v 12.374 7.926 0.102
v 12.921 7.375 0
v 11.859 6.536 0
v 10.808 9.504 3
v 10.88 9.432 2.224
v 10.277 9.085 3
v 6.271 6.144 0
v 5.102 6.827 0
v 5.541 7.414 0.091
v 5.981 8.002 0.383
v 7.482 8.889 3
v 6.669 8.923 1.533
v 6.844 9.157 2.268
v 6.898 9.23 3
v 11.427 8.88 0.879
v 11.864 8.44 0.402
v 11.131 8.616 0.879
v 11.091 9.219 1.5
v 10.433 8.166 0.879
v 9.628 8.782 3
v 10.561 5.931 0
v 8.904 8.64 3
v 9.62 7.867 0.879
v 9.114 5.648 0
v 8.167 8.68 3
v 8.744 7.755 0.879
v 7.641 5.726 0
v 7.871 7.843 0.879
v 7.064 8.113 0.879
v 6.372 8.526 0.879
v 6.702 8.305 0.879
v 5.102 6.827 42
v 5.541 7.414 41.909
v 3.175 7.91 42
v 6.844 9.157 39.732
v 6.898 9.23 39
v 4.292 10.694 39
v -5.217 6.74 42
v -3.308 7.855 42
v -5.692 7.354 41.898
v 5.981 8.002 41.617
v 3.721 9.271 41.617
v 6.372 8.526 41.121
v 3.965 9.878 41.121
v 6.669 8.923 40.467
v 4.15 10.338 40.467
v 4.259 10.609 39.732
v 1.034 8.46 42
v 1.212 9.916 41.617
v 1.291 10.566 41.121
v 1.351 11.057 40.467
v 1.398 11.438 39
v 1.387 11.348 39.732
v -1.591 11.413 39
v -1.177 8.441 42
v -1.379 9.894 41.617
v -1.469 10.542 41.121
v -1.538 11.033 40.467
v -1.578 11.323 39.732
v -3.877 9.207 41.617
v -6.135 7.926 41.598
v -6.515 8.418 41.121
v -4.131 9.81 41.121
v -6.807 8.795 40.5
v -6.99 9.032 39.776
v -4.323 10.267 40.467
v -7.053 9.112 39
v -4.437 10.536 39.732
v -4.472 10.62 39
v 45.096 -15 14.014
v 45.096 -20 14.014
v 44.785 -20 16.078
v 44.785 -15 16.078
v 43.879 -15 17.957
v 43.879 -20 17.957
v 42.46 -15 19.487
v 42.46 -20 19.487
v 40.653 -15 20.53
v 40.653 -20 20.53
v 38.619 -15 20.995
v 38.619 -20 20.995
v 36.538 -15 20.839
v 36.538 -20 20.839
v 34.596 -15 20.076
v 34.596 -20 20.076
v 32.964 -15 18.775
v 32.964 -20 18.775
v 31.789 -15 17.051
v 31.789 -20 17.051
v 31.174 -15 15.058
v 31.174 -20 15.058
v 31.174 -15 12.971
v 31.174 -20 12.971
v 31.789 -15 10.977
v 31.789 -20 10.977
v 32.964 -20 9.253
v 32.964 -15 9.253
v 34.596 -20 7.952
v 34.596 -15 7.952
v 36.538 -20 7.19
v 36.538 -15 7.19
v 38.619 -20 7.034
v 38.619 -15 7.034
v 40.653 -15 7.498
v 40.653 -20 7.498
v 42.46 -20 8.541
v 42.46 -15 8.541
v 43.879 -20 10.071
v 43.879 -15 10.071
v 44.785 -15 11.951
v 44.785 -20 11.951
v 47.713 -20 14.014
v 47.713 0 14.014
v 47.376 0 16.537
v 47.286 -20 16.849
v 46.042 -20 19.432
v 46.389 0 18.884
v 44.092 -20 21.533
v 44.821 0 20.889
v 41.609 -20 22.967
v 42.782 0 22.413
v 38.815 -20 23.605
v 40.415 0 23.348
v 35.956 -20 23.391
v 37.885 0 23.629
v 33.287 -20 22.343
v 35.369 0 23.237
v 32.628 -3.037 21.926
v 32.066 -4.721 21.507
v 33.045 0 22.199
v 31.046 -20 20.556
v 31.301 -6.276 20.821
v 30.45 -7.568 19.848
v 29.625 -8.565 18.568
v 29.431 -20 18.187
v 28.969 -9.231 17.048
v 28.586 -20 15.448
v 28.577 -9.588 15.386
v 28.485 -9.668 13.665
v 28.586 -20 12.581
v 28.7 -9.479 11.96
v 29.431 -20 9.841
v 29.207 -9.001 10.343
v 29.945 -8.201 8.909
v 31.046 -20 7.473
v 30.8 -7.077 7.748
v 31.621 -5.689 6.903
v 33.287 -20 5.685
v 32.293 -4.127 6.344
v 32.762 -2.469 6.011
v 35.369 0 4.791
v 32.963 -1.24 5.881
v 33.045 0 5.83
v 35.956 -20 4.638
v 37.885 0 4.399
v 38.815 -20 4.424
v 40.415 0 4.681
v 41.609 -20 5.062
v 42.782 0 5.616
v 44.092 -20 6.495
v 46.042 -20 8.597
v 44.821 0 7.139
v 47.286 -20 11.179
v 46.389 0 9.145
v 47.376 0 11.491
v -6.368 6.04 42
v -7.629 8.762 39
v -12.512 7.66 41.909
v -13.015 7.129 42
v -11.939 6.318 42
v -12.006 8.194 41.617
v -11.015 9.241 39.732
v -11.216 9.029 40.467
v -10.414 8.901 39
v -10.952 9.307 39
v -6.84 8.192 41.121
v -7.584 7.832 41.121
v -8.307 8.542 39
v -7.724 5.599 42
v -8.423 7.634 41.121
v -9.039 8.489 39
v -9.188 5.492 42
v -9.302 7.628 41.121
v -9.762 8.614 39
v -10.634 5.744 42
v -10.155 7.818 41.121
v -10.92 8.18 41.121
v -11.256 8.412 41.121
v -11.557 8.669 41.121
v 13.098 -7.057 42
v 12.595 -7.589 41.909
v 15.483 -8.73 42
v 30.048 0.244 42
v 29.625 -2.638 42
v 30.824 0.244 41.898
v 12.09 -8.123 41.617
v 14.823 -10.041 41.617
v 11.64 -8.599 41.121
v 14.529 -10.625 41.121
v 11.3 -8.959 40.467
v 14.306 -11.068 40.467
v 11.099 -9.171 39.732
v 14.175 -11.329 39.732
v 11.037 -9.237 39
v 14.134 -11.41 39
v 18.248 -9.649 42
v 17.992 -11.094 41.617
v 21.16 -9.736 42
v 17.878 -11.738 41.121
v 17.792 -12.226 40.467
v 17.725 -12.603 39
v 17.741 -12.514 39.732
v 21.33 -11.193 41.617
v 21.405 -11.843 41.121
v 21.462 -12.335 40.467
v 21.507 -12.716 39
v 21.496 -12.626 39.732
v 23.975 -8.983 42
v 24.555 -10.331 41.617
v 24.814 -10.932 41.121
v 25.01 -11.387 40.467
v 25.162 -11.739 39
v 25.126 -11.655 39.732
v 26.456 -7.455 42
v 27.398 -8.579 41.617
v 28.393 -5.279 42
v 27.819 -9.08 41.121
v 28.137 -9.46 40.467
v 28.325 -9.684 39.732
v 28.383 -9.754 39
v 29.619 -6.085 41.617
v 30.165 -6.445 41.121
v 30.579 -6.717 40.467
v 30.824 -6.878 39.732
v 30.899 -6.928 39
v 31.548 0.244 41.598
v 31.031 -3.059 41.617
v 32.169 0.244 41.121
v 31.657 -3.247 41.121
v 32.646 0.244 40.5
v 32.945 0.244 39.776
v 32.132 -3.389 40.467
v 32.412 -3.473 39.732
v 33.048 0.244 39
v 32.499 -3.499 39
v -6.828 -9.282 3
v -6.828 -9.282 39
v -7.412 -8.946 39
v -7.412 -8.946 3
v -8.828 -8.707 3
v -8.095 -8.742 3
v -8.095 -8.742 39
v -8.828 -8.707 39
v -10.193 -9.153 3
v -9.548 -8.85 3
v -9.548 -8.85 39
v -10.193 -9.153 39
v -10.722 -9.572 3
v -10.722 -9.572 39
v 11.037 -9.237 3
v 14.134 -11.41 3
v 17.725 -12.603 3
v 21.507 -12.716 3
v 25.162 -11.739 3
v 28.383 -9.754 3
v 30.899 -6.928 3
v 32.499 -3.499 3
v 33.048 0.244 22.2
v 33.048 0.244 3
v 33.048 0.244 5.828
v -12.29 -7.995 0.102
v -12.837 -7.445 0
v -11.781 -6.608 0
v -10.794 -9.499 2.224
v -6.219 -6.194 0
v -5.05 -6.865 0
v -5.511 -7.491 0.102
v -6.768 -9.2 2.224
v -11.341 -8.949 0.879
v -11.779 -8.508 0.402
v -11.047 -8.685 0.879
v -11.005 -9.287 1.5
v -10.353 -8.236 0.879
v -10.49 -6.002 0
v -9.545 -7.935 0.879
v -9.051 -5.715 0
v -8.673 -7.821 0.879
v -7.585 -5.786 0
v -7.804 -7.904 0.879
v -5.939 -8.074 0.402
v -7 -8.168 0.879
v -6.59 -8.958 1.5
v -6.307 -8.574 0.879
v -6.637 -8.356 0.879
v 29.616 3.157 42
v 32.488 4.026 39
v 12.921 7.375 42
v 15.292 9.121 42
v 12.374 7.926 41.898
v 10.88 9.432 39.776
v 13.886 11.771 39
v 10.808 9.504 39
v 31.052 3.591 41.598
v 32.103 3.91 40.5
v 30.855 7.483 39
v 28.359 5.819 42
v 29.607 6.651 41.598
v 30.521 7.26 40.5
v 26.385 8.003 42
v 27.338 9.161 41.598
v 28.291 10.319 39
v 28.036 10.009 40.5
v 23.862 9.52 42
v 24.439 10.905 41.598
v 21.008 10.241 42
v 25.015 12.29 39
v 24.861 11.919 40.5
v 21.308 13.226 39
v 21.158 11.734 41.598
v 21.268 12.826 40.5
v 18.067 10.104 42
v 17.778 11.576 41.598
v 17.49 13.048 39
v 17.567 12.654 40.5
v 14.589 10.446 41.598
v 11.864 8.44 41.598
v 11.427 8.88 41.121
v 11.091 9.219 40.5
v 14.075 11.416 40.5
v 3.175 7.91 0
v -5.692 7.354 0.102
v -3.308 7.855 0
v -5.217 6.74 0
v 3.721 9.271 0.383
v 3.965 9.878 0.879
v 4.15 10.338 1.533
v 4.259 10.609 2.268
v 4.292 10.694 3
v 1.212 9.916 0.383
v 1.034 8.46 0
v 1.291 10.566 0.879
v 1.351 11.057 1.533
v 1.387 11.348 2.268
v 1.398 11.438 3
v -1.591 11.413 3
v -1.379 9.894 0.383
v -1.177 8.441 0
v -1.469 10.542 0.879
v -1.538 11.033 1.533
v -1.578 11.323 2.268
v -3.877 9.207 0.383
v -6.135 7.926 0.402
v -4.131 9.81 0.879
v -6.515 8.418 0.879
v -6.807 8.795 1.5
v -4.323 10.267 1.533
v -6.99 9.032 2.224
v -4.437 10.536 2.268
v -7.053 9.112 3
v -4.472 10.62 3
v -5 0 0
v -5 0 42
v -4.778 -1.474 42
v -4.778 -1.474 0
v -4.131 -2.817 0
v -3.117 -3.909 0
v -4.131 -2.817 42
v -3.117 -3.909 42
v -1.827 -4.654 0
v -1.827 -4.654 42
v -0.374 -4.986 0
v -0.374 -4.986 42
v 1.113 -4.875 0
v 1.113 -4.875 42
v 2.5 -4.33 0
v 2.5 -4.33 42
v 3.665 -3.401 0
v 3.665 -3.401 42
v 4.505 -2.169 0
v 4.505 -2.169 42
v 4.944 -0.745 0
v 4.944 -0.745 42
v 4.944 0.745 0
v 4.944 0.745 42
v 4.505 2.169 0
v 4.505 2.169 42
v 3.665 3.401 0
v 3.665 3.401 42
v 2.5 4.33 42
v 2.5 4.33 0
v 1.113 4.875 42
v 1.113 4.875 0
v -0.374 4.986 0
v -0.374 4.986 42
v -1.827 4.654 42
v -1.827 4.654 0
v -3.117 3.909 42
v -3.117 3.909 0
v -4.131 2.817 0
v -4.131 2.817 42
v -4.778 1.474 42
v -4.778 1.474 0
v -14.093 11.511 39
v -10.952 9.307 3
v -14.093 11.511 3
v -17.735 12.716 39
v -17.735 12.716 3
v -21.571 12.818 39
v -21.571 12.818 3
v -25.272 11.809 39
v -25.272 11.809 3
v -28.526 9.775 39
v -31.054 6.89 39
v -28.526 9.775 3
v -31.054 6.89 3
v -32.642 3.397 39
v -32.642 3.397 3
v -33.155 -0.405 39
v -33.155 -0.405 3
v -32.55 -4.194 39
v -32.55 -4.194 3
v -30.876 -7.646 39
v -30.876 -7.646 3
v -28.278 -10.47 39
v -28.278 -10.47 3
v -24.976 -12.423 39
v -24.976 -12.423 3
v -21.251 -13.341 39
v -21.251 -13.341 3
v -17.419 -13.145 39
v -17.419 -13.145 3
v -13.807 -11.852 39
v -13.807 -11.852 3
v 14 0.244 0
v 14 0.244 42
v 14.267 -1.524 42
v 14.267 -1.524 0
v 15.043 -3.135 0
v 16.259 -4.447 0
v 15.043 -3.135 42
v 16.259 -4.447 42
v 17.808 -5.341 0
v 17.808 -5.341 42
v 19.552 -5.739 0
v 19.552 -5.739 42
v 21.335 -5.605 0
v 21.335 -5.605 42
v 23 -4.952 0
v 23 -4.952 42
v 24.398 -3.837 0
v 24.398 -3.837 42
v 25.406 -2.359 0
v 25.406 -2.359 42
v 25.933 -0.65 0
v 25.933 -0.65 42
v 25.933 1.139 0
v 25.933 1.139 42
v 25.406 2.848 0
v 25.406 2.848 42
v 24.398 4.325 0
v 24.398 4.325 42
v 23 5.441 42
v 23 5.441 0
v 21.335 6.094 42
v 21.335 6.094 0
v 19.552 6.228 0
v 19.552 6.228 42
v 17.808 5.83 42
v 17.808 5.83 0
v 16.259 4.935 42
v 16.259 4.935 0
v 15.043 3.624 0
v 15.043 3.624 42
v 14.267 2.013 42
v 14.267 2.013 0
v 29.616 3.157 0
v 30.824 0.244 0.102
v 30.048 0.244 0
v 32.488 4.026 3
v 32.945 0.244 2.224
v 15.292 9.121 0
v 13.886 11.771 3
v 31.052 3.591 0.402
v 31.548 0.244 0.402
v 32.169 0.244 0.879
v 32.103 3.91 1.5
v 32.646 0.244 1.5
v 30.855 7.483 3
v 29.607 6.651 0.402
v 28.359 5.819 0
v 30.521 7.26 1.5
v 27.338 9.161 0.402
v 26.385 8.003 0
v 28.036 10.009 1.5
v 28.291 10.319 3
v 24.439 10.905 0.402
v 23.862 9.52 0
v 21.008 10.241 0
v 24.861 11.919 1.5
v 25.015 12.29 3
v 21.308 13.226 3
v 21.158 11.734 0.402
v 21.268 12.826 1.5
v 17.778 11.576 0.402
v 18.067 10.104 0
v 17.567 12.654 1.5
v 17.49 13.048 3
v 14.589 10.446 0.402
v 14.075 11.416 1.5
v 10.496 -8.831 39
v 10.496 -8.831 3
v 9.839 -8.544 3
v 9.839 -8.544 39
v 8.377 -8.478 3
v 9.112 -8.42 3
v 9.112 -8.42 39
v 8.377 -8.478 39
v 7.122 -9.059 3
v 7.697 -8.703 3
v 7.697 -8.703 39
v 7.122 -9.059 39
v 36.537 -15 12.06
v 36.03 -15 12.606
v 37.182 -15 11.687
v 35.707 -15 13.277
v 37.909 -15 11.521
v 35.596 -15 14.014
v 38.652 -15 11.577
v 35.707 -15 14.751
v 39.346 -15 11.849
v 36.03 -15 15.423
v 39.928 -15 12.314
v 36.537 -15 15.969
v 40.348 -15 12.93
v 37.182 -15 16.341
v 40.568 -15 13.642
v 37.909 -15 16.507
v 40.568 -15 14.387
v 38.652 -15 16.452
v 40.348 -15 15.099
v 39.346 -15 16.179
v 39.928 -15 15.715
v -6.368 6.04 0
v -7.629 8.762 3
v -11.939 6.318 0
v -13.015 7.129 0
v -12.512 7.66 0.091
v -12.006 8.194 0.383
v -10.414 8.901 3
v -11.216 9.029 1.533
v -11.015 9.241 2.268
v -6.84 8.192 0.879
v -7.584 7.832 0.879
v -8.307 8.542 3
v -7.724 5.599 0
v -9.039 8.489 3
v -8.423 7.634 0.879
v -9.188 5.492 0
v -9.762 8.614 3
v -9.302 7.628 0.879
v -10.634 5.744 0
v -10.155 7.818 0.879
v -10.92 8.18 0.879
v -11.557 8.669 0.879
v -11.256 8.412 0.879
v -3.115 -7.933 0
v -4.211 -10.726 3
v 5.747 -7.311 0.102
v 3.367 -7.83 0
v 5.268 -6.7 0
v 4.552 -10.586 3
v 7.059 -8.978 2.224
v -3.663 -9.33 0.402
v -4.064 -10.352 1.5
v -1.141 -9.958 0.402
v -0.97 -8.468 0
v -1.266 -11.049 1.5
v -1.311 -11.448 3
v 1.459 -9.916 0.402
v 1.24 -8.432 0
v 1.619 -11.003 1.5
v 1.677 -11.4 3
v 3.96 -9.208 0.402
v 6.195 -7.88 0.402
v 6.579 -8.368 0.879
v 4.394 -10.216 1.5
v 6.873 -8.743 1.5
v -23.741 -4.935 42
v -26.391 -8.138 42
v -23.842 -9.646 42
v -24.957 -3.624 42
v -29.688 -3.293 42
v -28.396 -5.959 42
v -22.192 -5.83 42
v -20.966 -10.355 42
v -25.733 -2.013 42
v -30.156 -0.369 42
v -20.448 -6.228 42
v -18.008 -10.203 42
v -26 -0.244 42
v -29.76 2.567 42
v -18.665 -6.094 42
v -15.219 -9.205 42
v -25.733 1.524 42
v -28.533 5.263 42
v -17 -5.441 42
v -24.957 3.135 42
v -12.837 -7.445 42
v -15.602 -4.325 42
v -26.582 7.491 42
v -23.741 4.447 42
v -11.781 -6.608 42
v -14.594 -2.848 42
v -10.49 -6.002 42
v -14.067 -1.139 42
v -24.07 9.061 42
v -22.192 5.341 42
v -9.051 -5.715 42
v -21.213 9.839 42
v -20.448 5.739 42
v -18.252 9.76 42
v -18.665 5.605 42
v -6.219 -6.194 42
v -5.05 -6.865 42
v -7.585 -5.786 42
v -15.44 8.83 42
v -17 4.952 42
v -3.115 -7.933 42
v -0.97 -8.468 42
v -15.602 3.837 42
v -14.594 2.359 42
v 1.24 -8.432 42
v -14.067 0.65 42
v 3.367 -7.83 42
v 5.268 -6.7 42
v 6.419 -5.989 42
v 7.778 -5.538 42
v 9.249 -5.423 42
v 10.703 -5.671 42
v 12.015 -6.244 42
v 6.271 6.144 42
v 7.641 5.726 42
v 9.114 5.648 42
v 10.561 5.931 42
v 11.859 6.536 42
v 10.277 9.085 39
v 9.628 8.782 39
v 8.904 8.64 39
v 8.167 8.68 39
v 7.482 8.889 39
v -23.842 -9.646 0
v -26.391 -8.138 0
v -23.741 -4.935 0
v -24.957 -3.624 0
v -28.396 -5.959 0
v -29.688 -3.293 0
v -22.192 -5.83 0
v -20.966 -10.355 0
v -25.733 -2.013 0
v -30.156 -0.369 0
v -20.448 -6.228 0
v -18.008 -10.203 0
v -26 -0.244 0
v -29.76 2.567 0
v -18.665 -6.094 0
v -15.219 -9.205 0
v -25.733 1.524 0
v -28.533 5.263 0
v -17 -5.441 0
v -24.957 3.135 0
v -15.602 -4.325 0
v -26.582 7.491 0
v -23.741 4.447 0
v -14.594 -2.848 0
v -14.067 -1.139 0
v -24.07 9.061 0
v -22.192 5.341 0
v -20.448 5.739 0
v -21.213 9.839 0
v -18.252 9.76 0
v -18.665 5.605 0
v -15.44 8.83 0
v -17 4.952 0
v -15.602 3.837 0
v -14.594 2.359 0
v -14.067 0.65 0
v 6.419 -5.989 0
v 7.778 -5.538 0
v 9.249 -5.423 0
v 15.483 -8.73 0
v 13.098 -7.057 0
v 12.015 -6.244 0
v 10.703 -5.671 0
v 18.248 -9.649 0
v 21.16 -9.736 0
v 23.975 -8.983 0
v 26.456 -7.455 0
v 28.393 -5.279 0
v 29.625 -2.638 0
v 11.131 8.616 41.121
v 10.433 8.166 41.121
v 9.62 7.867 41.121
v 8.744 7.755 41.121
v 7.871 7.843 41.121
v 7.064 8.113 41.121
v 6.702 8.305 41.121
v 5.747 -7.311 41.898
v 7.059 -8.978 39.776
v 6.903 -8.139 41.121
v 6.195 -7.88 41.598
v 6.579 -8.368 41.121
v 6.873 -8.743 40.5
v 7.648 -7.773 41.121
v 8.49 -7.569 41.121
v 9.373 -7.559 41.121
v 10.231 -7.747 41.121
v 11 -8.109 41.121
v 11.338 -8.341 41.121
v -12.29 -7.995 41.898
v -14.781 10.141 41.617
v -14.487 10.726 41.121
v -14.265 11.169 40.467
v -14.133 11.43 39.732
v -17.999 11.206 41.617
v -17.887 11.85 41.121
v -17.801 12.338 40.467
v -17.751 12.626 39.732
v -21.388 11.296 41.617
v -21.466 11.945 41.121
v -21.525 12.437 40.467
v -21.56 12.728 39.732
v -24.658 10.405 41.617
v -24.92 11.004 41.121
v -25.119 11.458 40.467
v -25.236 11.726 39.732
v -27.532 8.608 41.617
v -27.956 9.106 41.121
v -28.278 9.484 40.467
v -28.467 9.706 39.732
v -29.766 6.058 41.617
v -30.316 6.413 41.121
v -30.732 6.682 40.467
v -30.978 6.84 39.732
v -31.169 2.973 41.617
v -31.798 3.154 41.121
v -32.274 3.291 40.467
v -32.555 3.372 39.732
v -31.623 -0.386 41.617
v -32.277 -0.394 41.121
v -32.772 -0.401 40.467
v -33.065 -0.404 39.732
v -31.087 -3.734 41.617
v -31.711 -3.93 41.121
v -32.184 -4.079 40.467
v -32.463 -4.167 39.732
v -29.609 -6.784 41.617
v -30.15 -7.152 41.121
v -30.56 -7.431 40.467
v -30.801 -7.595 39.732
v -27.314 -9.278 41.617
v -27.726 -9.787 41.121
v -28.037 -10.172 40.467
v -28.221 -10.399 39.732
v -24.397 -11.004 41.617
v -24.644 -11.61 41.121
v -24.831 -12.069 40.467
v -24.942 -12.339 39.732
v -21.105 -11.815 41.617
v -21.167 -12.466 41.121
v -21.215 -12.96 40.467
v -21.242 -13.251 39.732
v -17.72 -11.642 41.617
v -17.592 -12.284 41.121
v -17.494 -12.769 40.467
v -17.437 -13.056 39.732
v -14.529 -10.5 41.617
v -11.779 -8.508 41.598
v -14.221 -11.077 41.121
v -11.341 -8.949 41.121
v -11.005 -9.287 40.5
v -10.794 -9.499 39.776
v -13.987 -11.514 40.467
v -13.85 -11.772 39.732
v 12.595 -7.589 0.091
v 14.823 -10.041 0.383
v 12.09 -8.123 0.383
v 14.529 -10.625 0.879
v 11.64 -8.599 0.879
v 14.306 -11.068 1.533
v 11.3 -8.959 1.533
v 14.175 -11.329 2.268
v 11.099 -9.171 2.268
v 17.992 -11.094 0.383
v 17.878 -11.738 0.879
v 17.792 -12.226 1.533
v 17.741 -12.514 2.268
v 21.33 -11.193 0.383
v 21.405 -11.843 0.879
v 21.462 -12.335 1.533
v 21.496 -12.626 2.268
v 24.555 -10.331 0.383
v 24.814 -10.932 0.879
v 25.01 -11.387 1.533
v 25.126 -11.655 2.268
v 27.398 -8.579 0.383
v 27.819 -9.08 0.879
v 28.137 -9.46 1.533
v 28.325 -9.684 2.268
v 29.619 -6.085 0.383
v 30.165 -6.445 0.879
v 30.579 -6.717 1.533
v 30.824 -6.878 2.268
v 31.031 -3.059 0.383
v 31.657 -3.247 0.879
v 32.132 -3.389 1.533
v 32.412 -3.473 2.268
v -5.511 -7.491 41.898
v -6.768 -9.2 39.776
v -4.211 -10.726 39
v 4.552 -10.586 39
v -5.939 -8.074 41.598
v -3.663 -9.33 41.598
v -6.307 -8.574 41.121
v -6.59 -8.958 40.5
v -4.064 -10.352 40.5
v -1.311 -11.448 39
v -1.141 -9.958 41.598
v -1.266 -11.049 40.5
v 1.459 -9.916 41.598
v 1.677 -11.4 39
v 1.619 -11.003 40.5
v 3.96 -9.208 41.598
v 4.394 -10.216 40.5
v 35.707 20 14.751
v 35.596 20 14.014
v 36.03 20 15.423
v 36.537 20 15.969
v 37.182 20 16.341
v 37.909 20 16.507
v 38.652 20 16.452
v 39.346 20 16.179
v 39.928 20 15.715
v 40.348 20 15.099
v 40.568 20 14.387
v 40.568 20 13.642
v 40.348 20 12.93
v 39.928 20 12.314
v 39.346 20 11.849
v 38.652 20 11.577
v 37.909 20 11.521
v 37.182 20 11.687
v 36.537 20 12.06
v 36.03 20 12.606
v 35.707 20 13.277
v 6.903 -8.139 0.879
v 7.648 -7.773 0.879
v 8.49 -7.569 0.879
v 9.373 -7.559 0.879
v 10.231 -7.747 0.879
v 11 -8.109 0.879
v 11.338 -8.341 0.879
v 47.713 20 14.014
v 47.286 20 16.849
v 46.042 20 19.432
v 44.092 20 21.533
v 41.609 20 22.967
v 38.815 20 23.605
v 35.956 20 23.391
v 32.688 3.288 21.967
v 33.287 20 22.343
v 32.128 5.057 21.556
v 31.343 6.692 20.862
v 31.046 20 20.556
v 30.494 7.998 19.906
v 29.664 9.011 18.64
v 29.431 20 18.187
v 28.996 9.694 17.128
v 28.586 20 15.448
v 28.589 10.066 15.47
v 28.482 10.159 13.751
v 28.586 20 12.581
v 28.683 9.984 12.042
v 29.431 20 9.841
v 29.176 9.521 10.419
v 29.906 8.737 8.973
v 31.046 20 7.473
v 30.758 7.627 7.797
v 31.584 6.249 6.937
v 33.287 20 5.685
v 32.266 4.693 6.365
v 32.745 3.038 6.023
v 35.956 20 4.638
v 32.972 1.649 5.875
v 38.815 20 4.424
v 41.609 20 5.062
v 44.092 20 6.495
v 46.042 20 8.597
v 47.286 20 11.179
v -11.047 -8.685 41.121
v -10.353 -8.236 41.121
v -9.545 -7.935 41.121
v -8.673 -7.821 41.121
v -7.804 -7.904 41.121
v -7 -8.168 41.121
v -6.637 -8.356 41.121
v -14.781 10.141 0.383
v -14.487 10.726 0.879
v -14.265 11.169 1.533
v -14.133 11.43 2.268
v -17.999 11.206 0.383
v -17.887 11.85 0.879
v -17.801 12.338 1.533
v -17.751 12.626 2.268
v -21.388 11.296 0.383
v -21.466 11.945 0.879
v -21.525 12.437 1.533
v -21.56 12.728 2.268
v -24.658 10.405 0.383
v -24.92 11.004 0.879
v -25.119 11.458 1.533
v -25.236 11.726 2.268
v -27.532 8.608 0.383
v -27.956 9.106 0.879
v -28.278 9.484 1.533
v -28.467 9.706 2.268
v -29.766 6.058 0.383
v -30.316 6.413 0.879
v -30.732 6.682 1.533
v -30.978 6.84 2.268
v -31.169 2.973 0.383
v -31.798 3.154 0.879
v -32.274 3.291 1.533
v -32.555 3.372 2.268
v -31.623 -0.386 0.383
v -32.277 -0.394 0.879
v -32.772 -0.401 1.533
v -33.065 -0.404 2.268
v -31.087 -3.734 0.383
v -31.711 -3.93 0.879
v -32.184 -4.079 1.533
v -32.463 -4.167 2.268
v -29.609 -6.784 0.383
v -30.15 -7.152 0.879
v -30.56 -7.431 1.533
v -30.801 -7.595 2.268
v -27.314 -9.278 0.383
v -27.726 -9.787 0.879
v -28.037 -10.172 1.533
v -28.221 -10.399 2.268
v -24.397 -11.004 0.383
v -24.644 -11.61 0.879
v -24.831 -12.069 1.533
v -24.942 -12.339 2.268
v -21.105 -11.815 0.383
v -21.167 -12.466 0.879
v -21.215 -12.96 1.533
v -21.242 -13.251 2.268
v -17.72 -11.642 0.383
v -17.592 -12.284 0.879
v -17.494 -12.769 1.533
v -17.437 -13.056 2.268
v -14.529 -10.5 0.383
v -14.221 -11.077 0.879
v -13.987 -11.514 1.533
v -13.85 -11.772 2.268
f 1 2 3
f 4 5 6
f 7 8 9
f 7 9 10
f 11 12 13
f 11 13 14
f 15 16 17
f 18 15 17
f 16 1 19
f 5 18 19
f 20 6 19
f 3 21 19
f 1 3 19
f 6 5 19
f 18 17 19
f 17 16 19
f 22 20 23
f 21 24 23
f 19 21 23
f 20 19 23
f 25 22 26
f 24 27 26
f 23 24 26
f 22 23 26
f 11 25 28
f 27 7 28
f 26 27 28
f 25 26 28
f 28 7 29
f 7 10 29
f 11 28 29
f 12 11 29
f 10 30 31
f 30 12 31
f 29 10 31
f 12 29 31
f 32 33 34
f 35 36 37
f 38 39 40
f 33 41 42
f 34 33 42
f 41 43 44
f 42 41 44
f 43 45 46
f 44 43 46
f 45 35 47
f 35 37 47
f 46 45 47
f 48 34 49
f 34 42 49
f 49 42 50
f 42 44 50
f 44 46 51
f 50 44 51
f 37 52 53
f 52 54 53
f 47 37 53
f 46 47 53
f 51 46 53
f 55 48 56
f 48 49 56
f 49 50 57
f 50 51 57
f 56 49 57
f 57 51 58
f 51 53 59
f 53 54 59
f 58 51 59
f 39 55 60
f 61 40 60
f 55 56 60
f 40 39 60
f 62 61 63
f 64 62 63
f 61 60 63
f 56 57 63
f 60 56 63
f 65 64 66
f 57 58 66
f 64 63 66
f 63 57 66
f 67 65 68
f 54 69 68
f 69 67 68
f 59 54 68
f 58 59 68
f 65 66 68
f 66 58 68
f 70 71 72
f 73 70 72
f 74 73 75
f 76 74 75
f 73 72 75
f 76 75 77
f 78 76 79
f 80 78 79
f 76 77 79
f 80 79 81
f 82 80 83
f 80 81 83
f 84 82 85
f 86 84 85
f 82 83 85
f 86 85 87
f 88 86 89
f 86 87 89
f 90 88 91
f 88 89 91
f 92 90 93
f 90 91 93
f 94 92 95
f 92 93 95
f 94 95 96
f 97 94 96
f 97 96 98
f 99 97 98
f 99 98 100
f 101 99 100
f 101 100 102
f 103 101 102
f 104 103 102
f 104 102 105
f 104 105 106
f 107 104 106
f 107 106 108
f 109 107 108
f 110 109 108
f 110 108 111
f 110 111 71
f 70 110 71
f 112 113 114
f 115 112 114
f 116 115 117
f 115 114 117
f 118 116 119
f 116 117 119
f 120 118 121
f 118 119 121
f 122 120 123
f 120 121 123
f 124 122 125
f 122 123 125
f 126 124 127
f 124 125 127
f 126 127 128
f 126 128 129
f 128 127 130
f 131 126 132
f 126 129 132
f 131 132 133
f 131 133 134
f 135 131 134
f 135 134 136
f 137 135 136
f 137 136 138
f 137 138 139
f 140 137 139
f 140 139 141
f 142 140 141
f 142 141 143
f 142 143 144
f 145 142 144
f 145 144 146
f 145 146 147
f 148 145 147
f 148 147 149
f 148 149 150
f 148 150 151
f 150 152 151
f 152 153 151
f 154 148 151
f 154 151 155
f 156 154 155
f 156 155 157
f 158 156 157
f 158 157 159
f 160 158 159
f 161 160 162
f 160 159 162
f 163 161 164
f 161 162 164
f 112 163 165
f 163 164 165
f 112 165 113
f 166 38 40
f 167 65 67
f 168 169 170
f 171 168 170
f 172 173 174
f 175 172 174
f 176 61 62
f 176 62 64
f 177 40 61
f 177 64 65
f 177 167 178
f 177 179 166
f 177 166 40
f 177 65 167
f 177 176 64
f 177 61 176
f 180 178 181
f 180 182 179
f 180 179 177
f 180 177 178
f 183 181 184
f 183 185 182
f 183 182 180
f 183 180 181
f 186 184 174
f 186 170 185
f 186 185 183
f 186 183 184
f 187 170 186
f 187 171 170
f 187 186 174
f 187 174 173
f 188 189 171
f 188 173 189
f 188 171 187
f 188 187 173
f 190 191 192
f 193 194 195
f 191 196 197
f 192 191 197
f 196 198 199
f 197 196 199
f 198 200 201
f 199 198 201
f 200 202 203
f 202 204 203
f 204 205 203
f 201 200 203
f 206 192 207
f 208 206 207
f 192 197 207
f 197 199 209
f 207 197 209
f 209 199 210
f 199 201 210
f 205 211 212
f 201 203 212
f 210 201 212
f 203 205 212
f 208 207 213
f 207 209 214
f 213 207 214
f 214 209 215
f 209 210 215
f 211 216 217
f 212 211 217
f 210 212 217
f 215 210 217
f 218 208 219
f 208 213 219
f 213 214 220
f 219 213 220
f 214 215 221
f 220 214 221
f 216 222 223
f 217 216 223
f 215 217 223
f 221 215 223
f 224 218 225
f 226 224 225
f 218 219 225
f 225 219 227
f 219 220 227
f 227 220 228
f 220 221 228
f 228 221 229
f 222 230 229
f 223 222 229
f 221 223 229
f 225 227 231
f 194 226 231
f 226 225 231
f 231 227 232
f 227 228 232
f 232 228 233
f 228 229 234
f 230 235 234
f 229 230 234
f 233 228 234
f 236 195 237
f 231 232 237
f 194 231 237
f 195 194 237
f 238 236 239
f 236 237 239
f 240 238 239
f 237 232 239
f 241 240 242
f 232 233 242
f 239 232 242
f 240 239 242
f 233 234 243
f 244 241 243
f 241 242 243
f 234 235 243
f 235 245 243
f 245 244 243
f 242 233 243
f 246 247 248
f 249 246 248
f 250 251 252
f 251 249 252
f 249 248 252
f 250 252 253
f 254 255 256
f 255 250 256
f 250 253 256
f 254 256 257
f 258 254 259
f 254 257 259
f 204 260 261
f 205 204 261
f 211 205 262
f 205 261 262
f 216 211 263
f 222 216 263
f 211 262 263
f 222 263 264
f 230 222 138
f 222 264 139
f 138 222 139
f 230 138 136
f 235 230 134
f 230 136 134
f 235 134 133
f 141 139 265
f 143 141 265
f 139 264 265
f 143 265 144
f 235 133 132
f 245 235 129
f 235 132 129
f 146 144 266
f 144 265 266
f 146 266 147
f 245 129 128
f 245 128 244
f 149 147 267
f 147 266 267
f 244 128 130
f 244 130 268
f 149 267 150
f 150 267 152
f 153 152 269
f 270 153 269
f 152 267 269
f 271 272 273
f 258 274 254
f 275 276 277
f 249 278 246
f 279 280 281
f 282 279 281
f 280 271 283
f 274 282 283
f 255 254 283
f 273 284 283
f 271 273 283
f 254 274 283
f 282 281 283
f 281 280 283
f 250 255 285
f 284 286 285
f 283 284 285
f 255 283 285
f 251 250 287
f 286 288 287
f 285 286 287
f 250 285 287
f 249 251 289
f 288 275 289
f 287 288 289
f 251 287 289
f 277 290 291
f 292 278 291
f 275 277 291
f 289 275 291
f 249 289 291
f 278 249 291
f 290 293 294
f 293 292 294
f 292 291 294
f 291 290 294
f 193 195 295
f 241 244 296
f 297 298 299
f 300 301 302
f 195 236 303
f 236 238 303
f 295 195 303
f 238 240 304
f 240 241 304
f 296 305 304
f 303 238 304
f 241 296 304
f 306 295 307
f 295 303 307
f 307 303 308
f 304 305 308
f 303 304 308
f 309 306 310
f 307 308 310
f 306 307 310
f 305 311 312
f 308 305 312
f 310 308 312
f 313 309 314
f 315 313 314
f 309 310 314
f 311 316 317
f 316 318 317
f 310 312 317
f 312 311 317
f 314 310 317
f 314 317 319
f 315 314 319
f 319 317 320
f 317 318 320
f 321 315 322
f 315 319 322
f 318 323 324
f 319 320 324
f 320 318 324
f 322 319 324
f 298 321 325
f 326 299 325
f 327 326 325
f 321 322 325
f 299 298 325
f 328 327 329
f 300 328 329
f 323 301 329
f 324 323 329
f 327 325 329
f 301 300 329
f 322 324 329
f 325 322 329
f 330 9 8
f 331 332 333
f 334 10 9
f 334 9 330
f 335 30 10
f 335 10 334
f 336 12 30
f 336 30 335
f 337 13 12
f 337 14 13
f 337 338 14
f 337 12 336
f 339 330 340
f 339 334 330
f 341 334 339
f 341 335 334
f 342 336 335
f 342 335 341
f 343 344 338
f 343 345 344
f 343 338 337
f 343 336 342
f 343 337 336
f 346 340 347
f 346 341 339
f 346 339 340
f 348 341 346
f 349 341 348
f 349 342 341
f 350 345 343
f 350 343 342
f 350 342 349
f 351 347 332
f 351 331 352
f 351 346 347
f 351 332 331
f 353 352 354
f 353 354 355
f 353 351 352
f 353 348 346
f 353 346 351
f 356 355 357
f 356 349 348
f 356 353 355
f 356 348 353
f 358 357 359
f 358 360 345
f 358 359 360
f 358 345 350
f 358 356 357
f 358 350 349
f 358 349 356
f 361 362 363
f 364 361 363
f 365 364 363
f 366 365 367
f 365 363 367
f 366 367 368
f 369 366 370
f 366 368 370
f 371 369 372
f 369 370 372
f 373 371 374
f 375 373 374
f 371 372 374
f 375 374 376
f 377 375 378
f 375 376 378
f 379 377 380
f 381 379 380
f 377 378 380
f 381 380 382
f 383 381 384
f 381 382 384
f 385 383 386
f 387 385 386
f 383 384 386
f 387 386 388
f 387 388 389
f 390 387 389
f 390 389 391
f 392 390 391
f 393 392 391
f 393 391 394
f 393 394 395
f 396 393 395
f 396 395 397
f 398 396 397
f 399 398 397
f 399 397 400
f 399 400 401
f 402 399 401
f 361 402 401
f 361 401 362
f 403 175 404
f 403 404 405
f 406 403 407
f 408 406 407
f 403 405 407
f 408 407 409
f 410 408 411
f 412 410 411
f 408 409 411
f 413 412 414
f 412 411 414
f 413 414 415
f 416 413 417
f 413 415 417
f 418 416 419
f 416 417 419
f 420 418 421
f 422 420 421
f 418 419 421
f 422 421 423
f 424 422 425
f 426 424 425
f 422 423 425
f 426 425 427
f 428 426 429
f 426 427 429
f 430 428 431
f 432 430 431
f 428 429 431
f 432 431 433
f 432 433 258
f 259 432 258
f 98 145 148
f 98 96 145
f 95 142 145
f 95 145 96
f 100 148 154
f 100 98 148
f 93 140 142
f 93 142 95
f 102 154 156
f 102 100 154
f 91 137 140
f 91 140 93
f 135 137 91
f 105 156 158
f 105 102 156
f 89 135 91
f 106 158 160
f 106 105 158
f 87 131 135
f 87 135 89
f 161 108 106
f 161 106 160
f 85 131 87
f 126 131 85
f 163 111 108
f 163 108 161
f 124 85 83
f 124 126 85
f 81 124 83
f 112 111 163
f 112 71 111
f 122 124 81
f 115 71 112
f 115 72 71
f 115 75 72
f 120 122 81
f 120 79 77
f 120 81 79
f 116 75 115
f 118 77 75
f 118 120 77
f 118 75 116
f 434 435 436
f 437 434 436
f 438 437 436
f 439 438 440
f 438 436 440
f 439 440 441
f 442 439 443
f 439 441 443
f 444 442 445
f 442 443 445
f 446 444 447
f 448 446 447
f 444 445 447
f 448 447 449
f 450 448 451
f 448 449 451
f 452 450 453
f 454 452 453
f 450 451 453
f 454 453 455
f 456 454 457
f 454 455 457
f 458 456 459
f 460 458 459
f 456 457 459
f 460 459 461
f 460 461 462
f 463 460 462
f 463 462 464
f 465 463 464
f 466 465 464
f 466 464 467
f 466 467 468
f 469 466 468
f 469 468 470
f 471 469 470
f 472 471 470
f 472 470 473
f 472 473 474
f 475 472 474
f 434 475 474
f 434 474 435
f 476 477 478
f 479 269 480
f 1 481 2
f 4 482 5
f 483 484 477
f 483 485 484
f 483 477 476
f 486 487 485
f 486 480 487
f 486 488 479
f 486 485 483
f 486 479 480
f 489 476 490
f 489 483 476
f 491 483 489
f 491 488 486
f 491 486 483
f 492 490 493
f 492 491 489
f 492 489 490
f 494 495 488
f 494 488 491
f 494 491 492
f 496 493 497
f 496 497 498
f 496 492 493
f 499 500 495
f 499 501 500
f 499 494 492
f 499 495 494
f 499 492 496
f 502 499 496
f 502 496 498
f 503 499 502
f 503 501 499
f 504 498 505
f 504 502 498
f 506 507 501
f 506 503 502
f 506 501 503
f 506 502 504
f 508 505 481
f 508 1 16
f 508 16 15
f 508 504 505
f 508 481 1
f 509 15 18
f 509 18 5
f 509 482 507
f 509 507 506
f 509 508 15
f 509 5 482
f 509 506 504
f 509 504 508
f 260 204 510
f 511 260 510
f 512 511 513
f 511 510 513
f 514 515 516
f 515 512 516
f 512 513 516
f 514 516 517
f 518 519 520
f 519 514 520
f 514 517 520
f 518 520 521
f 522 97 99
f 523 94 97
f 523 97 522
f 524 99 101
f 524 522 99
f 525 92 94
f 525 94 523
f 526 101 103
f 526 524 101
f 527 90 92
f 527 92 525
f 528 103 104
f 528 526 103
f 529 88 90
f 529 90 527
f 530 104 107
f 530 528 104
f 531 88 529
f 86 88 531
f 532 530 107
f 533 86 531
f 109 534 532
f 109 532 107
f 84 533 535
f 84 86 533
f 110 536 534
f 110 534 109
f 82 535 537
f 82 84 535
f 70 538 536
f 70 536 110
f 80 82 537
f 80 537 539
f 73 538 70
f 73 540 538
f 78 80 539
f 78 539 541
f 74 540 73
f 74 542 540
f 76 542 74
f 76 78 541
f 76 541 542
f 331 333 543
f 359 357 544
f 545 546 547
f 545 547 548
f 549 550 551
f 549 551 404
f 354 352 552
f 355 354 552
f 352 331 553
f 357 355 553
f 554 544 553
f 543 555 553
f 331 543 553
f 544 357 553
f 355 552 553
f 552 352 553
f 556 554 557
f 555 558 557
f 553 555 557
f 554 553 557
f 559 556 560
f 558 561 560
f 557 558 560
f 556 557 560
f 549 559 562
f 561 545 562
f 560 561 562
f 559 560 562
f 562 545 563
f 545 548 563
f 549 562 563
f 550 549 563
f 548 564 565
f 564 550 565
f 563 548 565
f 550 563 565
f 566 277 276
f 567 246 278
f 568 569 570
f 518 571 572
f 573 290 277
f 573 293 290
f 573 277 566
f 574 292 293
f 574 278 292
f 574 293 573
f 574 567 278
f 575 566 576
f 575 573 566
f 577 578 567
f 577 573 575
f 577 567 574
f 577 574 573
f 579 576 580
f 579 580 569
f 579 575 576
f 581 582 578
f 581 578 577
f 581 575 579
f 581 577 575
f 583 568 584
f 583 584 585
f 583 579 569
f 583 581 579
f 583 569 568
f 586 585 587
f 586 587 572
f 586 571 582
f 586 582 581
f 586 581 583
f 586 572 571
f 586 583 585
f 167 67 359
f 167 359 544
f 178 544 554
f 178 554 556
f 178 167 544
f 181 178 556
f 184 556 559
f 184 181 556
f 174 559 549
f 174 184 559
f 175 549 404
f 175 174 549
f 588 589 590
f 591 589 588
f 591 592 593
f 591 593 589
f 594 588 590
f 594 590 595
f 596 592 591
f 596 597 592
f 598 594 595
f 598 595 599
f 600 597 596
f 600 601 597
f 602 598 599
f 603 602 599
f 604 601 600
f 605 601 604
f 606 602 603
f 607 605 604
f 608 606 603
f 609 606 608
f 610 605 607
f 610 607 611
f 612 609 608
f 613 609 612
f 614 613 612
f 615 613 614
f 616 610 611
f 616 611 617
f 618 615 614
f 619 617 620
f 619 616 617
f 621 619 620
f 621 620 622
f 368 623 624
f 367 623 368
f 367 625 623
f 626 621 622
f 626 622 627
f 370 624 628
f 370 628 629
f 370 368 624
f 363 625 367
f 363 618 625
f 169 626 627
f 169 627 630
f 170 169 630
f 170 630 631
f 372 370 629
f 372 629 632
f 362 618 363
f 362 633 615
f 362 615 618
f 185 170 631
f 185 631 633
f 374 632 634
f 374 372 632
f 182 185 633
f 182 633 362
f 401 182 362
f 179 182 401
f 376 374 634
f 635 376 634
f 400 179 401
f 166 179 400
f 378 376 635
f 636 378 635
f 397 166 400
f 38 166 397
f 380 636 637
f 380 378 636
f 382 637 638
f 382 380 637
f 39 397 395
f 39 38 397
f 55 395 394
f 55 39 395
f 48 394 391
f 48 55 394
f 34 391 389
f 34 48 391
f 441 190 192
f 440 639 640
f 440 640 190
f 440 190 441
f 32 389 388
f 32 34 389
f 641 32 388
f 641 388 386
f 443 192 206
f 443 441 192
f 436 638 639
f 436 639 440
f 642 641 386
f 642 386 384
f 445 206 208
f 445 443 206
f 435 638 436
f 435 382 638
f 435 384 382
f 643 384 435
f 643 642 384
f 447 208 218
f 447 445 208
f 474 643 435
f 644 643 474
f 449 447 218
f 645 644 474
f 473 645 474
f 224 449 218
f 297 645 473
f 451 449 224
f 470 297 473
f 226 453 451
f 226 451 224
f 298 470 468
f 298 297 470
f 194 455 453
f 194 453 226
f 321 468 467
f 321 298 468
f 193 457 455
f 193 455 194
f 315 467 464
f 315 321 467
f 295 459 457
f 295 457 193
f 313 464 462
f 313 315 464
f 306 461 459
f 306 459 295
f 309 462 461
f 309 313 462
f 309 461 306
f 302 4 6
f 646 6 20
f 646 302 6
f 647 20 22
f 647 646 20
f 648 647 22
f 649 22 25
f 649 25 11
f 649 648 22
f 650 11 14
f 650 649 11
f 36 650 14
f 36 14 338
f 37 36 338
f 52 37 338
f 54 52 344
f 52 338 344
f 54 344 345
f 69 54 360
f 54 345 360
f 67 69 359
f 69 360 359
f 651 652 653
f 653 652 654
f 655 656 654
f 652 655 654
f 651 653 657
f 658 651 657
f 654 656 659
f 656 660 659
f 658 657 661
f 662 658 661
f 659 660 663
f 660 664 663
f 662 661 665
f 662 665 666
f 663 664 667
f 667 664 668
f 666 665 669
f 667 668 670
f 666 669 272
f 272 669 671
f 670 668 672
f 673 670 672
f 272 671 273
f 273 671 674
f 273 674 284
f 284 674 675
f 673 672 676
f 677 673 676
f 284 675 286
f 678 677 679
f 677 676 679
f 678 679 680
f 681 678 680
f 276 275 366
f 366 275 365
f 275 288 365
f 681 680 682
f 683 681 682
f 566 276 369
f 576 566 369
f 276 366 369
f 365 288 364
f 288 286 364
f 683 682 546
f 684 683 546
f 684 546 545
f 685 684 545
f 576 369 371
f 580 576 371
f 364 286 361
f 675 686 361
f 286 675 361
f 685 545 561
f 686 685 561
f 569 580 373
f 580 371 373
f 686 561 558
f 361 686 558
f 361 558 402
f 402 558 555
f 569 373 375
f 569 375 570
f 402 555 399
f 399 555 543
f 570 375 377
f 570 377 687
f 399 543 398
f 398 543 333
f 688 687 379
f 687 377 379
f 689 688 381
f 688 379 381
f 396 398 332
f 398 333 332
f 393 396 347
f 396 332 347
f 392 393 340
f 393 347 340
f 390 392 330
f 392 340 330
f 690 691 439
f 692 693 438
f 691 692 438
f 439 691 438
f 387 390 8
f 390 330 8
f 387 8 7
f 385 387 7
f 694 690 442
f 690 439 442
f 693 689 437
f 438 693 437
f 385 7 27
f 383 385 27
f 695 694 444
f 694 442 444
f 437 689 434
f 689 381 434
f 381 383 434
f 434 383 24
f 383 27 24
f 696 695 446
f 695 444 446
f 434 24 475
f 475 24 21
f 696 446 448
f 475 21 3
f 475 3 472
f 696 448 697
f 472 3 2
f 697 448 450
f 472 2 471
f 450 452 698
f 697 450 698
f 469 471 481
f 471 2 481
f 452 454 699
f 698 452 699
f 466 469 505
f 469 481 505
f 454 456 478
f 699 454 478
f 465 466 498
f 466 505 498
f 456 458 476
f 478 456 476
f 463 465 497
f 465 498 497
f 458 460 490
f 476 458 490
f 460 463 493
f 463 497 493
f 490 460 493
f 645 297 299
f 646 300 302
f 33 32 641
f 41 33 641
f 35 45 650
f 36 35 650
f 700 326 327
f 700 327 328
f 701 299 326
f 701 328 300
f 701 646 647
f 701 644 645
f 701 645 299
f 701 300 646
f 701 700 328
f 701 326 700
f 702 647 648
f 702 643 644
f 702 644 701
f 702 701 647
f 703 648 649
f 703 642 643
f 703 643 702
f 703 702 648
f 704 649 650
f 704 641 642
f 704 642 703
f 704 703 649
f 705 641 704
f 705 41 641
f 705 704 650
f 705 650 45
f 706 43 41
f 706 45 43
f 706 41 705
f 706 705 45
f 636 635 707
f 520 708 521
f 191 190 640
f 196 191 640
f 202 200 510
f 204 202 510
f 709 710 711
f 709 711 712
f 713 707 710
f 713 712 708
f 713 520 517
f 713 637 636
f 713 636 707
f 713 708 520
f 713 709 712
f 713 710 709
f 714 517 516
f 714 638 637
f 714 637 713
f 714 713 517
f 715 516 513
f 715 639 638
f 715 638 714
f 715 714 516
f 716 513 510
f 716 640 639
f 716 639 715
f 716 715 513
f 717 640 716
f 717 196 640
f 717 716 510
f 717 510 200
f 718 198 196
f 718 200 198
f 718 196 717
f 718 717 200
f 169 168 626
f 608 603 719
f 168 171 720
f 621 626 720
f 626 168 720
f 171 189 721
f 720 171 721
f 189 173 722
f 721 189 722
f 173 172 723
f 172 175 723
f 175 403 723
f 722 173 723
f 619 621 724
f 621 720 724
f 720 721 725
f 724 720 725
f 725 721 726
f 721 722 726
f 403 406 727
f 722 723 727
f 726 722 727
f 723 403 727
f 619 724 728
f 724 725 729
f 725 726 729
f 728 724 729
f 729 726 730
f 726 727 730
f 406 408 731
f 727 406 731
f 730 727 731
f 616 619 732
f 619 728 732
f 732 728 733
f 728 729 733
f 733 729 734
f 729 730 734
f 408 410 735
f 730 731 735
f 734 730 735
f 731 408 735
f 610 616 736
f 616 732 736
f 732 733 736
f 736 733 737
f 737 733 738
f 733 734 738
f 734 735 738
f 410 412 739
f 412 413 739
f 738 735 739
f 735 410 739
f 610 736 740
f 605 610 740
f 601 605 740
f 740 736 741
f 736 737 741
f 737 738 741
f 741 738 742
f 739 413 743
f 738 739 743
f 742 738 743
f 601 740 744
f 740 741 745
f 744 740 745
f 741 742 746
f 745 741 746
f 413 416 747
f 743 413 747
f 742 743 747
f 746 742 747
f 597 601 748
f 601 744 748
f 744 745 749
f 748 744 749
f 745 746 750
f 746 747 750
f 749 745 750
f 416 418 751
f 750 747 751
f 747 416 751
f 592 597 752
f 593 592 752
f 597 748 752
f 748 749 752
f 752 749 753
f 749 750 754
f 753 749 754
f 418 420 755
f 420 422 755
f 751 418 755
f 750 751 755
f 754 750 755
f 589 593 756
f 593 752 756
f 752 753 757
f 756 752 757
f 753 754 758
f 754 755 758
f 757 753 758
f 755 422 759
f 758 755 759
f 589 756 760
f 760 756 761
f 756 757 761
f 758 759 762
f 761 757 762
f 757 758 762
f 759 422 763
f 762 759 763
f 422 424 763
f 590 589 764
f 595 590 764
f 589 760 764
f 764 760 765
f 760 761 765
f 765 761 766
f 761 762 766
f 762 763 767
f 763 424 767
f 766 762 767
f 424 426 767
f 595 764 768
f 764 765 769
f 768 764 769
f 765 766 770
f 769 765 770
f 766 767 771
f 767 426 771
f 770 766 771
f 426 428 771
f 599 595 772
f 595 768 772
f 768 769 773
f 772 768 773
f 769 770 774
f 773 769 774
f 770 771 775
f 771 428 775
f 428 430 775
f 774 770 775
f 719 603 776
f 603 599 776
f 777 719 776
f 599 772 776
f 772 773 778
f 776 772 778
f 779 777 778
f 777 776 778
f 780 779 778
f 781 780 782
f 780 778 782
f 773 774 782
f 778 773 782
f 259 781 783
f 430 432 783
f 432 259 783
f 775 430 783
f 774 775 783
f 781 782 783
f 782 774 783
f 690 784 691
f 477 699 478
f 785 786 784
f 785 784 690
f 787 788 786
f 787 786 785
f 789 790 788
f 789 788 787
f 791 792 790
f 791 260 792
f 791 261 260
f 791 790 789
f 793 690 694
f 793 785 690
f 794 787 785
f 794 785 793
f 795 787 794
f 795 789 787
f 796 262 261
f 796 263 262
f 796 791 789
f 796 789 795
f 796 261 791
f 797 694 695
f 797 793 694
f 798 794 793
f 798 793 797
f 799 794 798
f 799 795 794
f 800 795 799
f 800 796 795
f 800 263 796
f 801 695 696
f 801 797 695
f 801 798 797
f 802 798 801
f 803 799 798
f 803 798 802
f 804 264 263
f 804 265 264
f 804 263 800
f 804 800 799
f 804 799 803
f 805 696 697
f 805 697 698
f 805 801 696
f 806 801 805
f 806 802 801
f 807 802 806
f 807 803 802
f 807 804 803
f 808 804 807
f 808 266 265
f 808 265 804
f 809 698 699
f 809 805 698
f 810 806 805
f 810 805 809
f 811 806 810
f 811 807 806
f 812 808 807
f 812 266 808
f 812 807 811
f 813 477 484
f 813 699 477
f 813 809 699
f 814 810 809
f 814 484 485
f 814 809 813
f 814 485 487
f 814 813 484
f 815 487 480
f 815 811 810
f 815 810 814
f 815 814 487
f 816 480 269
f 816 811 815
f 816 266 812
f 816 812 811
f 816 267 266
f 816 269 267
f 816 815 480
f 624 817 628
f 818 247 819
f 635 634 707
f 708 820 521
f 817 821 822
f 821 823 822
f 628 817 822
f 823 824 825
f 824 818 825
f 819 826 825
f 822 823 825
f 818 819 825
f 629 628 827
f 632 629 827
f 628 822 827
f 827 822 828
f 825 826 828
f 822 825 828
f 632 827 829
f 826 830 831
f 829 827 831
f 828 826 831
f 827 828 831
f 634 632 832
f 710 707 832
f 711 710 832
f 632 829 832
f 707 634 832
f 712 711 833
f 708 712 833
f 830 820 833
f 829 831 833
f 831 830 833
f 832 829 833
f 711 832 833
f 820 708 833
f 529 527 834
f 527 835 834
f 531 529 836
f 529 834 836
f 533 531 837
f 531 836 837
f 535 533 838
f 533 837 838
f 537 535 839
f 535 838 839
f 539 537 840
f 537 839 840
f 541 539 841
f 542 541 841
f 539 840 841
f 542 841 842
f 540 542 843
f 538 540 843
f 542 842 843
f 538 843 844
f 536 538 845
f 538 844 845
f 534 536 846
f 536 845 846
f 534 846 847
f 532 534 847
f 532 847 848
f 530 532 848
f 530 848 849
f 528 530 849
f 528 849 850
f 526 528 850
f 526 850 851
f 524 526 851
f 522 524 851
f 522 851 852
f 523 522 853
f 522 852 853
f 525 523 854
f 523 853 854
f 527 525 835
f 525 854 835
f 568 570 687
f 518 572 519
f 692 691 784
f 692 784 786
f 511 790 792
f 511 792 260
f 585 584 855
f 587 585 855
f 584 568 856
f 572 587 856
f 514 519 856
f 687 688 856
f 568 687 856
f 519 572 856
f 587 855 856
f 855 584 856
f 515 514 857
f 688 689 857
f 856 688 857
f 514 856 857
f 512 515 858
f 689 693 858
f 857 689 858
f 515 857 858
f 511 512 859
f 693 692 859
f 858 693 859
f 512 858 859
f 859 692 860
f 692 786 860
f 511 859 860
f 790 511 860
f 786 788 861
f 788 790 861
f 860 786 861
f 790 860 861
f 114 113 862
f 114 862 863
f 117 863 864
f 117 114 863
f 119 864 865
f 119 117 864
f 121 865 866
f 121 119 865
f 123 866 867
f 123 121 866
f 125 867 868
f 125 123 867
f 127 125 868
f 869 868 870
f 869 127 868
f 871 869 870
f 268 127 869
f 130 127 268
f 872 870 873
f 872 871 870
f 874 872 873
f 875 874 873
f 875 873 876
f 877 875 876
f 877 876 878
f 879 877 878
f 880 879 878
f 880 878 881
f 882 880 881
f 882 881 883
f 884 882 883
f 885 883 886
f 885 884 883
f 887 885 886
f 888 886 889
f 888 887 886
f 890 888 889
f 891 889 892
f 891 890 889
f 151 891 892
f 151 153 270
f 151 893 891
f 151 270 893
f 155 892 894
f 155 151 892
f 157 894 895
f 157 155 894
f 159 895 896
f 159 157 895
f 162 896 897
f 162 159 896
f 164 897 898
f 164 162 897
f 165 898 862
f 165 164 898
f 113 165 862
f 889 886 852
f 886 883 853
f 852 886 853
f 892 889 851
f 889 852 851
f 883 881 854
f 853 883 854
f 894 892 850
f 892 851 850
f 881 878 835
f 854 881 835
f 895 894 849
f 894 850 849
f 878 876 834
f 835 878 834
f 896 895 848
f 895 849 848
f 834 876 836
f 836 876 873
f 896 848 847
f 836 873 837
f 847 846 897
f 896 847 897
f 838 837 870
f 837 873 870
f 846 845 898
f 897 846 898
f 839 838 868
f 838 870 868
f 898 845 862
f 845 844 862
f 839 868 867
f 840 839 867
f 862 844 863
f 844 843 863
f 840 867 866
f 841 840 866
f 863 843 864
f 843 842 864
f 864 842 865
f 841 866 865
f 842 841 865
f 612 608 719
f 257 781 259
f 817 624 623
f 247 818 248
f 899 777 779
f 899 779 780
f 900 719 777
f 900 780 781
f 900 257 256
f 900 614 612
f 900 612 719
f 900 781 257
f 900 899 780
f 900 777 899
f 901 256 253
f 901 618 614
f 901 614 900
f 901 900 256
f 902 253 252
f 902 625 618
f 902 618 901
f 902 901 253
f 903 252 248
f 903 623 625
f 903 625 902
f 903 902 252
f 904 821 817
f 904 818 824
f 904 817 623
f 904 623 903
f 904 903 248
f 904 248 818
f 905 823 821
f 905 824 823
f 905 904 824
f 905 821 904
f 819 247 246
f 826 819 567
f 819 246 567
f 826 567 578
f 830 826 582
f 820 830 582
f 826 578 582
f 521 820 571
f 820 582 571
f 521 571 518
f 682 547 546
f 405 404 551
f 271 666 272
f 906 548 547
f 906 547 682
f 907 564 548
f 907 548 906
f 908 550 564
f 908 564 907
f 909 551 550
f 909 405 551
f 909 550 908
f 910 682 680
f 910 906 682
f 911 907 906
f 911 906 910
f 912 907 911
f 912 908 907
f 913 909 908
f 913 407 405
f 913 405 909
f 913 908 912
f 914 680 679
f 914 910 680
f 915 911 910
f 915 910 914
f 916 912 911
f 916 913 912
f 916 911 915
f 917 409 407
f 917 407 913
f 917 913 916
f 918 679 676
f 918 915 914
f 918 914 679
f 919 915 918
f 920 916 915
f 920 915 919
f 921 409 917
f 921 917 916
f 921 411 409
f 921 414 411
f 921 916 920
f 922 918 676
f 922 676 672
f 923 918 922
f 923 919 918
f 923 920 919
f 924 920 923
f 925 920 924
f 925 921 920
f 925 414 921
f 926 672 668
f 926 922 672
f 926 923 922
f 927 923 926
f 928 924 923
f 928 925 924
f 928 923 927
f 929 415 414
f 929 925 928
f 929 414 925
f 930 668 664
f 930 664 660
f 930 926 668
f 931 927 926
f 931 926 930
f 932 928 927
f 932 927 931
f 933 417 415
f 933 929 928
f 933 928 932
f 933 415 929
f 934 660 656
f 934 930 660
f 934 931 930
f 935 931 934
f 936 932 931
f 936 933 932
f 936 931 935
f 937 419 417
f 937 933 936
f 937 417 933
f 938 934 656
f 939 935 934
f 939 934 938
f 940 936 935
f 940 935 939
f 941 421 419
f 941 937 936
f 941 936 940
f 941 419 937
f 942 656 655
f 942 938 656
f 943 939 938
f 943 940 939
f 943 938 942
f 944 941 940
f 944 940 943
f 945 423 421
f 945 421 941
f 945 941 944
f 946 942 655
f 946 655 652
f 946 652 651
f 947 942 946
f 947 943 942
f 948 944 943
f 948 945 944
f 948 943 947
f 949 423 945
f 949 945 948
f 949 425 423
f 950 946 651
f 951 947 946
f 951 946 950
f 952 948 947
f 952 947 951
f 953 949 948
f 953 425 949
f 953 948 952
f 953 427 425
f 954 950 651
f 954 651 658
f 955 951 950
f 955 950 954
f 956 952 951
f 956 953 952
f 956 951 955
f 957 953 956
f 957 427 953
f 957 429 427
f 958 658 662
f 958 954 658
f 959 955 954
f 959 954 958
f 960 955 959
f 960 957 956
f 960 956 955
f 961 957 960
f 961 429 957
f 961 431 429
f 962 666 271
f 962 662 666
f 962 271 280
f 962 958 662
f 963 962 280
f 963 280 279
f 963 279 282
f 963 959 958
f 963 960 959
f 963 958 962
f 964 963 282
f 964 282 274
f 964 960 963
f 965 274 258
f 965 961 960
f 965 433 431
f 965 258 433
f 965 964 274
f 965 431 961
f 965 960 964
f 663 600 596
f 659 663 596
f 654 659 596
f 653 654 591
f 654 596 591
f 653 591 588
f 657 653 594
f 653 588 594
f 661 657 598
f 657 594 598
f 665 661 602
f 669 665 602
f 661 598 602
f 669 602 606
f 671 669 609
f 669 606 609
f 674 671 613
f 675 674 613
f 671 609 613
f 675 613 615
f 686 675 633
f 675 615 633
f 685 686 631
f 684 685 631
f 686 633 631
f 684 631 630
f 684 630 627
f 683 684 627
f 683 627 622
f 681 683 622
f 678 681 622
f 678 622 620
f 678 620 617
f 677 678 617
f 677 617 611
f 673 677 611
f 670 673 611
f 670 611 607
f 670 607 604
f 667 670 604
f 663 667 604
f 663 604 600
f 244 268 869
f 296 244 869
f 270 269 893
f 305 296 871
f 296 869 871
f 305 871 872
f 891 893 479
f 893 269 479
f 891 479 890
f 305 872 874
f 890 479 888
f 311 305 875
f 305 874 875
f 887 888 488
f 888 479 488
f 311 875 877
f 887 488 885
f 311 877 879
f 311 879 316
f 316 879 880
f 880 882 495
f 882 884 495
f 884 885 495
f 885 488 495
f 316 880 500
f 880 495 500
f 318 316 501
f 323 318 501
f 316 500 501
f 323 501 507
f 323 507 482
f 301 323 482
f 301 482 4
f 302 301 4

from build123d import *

# Parameters (mm, degrees)
F1_DEPTH       = 42
F2_R           = 9.6174487521
F3_DEPTH       = 20
F4_DEPTH       = 20
F5_D           = 12
F6_D           = 10
F8_D           = 5
F8_CBORE_D     = 14
F8_CBORE_DEPTH = 5
F9_F1_R        = 3
F9_F2_R        = 3


# Not quite as in the source:
# - a feature names something its author has since deleted; it is built from what else it names


with BuildPart() as f1:
    # F0 (on Top) → F1 (new body)
    with BuildSketch(Plane.XY):
        with BuildLine():
            ThreePointArc((9.1505627454, -7.0033062659), (23.7868709109, -12.2415465763), (33.0476022533, 0.2444268846))
            ThreePointArc((33.0476022533, 0.2444268846), (23.6340041516, 12.7757451866), (8.9766756052, 7.2248454857))
            ThreePointArc((8.9766756052, 7.2248454857), (10.8677771882, 3.8302109864), (11.5229812641, 0))
            ThreePointArc((11.5229812641, 0), (10.9137724982, -3.6971160477), (9.1505627454, -7.0033062659))
        make_face()
        with BuildLine():
            ThreePointArc((11.5229812641, 0), (10.8677771882, 3.8302109864), (8.9766756052, 7.2248454857))
            ThreePointArc((8.9766756052, 7.2248454857), (6.9533720407, 0.0849795533), (9.1505627454, -7.0033062659))
            ThreePointArc((9.1505627454, -7.0033062659), (10.9137724982, -3.6971160477), (11.5229812641, 0))
        make_face()
        with BuildLine():
            ThreePointArc((9.1505627454, -7.0033062659), (6.9533720407, 0.0849795533), (8.9766756052, 7.2248454857))
            ThreePointArc((8.9766756052, 7.2248454857), (-0.0835171314, 11.5226785992), (-9.0804592928, 7.0939661858))
            ThreePointArc((-9.0804592928, 7.0939661858), (-7.415302968, 3.5914280039), (-6.8436942073, -0.2444268846))
            ThreePointArc((-6.8436942073, -0.2444268846), (-7.3693668934, -3.9262049114), (-8.9043774496, -7.3137650665))
            ThreePointArc((-8.9043774496, -7.3137650665), (0.1981109959, -11.5212781082), (9.1505627454, -7.0033062659))
        make_face()
        with BuildLine():
            ThreePointArc((-6.8436942073, -0.2444268846), (-7.415302968, 3.5914280039), (-9.0804592928, 7.0939661858))
            ThreePointArc((-9.0804592928, 7.0939661858), (-11.522120817, -0.1408158047), (-8.9043774496, -7.3137650665))
            ThreePointArc((-8.9043774496, -7.3137650665), (-7.3693668934, -3.9262049114), (-6.8436942073, -0.2444268846))
        make_face()
        with BuildLine():
            ThreePointArc((-8.9043774496, -7.3137650665), (-11.522120817, -0.1408158047), (-9.0804592928, 7.0939661858))
            ThreePointArc((-9.0804592928, 7.0939661858), (-33.1553233816, -0.40520262), (-8.9043774496, -7.3137650665))
        make_face()
    extrude(amount=F1_DEPTH)

    # F2 (on Front) → F3 (join)
    with BuildSketch(Plane.XZ):
        with Locations((38.0958206952, 14.0142505988)):
            Circle(F2_R)
    extrude(amount=F3_DEPTH)

    # F2 (on Front) → F4 (join)
    with BuildSketch(Plane.XZ):
        with Locations((38.0958206952, 14.0142505988)):
            Circle(F2_R)
    extrude(amount=-F4_DEPTH)

    # F5 (through all)
    with Locations(Plane(origin=(0, 0, 0), x_dir=(1, 0, 0), z_dir=(0, 0, -1))):
        with Locations((-20, 0.2444268846), (20, -0.2444268846)):
            Hole(F5_D / 2)

    # F6 (through all)
    with Locations(Plane(origin=(0, 0, 0), x_dir=(1, 0, 0), z_dir=(0, 0, -1))):
        with Locations((0, 0)):
            Hole(F6_D / 2)

    # F8 (through all)
    with Locations(Plane.XZ.offset(20)):
        with Locations((38.0958206952, 14.0142505988)):
            CounterBoreHole(F8_D / 2, F8_CBORE_D / 2, F8_CBORE_DEPTH)

    # F9: fillet of radius 3 on 8 edges, made by hand

    # F9_f1
    f9_f1_edges = [f1.edges().sort_by_distance(p)[0] for p in [
        (-8.9043774496, -7.3137650665, 21),
        (9.1505627454, -7.0033062659, 21),
        (8.9766756052, 7.2248454857, 21),
        (-9.0804592928, 7.0939661858, 21),
    ]]
    fillet(f9_f1_edges, radius=F9_F1_R)

    # F9_f2
    f9_f2_edges = [f1.edges().sort_by_distance(p)[0] for p in [
        (0.1844290224, -11.5215052466, 0),
        (0.1844290224, -11.5215052466, 42),
        (-0.0972005694, 11.5225712956, 0),
        (-0.0972005694, 11.5225712956, 42),
        (8.9038484363, 8.6404608623, 42),
        (-9.0385400019, 8.4885169801, 42),
        (8.9038484363, 8.6404608623, 0),
        (-9.0385400019, 8.4885169801, 0),
        (-8.8283891992, -8.7068748722, 42),
        (9.112353607, -8.4202786555, 42),
        (-8.8283891992, -8.7068748722, 0),
        (9.112353607, -8.4202786555, 0),
    ]]
    fillet(f9_f2_edges, radius=F9_F2_R)


solid = f1.part
